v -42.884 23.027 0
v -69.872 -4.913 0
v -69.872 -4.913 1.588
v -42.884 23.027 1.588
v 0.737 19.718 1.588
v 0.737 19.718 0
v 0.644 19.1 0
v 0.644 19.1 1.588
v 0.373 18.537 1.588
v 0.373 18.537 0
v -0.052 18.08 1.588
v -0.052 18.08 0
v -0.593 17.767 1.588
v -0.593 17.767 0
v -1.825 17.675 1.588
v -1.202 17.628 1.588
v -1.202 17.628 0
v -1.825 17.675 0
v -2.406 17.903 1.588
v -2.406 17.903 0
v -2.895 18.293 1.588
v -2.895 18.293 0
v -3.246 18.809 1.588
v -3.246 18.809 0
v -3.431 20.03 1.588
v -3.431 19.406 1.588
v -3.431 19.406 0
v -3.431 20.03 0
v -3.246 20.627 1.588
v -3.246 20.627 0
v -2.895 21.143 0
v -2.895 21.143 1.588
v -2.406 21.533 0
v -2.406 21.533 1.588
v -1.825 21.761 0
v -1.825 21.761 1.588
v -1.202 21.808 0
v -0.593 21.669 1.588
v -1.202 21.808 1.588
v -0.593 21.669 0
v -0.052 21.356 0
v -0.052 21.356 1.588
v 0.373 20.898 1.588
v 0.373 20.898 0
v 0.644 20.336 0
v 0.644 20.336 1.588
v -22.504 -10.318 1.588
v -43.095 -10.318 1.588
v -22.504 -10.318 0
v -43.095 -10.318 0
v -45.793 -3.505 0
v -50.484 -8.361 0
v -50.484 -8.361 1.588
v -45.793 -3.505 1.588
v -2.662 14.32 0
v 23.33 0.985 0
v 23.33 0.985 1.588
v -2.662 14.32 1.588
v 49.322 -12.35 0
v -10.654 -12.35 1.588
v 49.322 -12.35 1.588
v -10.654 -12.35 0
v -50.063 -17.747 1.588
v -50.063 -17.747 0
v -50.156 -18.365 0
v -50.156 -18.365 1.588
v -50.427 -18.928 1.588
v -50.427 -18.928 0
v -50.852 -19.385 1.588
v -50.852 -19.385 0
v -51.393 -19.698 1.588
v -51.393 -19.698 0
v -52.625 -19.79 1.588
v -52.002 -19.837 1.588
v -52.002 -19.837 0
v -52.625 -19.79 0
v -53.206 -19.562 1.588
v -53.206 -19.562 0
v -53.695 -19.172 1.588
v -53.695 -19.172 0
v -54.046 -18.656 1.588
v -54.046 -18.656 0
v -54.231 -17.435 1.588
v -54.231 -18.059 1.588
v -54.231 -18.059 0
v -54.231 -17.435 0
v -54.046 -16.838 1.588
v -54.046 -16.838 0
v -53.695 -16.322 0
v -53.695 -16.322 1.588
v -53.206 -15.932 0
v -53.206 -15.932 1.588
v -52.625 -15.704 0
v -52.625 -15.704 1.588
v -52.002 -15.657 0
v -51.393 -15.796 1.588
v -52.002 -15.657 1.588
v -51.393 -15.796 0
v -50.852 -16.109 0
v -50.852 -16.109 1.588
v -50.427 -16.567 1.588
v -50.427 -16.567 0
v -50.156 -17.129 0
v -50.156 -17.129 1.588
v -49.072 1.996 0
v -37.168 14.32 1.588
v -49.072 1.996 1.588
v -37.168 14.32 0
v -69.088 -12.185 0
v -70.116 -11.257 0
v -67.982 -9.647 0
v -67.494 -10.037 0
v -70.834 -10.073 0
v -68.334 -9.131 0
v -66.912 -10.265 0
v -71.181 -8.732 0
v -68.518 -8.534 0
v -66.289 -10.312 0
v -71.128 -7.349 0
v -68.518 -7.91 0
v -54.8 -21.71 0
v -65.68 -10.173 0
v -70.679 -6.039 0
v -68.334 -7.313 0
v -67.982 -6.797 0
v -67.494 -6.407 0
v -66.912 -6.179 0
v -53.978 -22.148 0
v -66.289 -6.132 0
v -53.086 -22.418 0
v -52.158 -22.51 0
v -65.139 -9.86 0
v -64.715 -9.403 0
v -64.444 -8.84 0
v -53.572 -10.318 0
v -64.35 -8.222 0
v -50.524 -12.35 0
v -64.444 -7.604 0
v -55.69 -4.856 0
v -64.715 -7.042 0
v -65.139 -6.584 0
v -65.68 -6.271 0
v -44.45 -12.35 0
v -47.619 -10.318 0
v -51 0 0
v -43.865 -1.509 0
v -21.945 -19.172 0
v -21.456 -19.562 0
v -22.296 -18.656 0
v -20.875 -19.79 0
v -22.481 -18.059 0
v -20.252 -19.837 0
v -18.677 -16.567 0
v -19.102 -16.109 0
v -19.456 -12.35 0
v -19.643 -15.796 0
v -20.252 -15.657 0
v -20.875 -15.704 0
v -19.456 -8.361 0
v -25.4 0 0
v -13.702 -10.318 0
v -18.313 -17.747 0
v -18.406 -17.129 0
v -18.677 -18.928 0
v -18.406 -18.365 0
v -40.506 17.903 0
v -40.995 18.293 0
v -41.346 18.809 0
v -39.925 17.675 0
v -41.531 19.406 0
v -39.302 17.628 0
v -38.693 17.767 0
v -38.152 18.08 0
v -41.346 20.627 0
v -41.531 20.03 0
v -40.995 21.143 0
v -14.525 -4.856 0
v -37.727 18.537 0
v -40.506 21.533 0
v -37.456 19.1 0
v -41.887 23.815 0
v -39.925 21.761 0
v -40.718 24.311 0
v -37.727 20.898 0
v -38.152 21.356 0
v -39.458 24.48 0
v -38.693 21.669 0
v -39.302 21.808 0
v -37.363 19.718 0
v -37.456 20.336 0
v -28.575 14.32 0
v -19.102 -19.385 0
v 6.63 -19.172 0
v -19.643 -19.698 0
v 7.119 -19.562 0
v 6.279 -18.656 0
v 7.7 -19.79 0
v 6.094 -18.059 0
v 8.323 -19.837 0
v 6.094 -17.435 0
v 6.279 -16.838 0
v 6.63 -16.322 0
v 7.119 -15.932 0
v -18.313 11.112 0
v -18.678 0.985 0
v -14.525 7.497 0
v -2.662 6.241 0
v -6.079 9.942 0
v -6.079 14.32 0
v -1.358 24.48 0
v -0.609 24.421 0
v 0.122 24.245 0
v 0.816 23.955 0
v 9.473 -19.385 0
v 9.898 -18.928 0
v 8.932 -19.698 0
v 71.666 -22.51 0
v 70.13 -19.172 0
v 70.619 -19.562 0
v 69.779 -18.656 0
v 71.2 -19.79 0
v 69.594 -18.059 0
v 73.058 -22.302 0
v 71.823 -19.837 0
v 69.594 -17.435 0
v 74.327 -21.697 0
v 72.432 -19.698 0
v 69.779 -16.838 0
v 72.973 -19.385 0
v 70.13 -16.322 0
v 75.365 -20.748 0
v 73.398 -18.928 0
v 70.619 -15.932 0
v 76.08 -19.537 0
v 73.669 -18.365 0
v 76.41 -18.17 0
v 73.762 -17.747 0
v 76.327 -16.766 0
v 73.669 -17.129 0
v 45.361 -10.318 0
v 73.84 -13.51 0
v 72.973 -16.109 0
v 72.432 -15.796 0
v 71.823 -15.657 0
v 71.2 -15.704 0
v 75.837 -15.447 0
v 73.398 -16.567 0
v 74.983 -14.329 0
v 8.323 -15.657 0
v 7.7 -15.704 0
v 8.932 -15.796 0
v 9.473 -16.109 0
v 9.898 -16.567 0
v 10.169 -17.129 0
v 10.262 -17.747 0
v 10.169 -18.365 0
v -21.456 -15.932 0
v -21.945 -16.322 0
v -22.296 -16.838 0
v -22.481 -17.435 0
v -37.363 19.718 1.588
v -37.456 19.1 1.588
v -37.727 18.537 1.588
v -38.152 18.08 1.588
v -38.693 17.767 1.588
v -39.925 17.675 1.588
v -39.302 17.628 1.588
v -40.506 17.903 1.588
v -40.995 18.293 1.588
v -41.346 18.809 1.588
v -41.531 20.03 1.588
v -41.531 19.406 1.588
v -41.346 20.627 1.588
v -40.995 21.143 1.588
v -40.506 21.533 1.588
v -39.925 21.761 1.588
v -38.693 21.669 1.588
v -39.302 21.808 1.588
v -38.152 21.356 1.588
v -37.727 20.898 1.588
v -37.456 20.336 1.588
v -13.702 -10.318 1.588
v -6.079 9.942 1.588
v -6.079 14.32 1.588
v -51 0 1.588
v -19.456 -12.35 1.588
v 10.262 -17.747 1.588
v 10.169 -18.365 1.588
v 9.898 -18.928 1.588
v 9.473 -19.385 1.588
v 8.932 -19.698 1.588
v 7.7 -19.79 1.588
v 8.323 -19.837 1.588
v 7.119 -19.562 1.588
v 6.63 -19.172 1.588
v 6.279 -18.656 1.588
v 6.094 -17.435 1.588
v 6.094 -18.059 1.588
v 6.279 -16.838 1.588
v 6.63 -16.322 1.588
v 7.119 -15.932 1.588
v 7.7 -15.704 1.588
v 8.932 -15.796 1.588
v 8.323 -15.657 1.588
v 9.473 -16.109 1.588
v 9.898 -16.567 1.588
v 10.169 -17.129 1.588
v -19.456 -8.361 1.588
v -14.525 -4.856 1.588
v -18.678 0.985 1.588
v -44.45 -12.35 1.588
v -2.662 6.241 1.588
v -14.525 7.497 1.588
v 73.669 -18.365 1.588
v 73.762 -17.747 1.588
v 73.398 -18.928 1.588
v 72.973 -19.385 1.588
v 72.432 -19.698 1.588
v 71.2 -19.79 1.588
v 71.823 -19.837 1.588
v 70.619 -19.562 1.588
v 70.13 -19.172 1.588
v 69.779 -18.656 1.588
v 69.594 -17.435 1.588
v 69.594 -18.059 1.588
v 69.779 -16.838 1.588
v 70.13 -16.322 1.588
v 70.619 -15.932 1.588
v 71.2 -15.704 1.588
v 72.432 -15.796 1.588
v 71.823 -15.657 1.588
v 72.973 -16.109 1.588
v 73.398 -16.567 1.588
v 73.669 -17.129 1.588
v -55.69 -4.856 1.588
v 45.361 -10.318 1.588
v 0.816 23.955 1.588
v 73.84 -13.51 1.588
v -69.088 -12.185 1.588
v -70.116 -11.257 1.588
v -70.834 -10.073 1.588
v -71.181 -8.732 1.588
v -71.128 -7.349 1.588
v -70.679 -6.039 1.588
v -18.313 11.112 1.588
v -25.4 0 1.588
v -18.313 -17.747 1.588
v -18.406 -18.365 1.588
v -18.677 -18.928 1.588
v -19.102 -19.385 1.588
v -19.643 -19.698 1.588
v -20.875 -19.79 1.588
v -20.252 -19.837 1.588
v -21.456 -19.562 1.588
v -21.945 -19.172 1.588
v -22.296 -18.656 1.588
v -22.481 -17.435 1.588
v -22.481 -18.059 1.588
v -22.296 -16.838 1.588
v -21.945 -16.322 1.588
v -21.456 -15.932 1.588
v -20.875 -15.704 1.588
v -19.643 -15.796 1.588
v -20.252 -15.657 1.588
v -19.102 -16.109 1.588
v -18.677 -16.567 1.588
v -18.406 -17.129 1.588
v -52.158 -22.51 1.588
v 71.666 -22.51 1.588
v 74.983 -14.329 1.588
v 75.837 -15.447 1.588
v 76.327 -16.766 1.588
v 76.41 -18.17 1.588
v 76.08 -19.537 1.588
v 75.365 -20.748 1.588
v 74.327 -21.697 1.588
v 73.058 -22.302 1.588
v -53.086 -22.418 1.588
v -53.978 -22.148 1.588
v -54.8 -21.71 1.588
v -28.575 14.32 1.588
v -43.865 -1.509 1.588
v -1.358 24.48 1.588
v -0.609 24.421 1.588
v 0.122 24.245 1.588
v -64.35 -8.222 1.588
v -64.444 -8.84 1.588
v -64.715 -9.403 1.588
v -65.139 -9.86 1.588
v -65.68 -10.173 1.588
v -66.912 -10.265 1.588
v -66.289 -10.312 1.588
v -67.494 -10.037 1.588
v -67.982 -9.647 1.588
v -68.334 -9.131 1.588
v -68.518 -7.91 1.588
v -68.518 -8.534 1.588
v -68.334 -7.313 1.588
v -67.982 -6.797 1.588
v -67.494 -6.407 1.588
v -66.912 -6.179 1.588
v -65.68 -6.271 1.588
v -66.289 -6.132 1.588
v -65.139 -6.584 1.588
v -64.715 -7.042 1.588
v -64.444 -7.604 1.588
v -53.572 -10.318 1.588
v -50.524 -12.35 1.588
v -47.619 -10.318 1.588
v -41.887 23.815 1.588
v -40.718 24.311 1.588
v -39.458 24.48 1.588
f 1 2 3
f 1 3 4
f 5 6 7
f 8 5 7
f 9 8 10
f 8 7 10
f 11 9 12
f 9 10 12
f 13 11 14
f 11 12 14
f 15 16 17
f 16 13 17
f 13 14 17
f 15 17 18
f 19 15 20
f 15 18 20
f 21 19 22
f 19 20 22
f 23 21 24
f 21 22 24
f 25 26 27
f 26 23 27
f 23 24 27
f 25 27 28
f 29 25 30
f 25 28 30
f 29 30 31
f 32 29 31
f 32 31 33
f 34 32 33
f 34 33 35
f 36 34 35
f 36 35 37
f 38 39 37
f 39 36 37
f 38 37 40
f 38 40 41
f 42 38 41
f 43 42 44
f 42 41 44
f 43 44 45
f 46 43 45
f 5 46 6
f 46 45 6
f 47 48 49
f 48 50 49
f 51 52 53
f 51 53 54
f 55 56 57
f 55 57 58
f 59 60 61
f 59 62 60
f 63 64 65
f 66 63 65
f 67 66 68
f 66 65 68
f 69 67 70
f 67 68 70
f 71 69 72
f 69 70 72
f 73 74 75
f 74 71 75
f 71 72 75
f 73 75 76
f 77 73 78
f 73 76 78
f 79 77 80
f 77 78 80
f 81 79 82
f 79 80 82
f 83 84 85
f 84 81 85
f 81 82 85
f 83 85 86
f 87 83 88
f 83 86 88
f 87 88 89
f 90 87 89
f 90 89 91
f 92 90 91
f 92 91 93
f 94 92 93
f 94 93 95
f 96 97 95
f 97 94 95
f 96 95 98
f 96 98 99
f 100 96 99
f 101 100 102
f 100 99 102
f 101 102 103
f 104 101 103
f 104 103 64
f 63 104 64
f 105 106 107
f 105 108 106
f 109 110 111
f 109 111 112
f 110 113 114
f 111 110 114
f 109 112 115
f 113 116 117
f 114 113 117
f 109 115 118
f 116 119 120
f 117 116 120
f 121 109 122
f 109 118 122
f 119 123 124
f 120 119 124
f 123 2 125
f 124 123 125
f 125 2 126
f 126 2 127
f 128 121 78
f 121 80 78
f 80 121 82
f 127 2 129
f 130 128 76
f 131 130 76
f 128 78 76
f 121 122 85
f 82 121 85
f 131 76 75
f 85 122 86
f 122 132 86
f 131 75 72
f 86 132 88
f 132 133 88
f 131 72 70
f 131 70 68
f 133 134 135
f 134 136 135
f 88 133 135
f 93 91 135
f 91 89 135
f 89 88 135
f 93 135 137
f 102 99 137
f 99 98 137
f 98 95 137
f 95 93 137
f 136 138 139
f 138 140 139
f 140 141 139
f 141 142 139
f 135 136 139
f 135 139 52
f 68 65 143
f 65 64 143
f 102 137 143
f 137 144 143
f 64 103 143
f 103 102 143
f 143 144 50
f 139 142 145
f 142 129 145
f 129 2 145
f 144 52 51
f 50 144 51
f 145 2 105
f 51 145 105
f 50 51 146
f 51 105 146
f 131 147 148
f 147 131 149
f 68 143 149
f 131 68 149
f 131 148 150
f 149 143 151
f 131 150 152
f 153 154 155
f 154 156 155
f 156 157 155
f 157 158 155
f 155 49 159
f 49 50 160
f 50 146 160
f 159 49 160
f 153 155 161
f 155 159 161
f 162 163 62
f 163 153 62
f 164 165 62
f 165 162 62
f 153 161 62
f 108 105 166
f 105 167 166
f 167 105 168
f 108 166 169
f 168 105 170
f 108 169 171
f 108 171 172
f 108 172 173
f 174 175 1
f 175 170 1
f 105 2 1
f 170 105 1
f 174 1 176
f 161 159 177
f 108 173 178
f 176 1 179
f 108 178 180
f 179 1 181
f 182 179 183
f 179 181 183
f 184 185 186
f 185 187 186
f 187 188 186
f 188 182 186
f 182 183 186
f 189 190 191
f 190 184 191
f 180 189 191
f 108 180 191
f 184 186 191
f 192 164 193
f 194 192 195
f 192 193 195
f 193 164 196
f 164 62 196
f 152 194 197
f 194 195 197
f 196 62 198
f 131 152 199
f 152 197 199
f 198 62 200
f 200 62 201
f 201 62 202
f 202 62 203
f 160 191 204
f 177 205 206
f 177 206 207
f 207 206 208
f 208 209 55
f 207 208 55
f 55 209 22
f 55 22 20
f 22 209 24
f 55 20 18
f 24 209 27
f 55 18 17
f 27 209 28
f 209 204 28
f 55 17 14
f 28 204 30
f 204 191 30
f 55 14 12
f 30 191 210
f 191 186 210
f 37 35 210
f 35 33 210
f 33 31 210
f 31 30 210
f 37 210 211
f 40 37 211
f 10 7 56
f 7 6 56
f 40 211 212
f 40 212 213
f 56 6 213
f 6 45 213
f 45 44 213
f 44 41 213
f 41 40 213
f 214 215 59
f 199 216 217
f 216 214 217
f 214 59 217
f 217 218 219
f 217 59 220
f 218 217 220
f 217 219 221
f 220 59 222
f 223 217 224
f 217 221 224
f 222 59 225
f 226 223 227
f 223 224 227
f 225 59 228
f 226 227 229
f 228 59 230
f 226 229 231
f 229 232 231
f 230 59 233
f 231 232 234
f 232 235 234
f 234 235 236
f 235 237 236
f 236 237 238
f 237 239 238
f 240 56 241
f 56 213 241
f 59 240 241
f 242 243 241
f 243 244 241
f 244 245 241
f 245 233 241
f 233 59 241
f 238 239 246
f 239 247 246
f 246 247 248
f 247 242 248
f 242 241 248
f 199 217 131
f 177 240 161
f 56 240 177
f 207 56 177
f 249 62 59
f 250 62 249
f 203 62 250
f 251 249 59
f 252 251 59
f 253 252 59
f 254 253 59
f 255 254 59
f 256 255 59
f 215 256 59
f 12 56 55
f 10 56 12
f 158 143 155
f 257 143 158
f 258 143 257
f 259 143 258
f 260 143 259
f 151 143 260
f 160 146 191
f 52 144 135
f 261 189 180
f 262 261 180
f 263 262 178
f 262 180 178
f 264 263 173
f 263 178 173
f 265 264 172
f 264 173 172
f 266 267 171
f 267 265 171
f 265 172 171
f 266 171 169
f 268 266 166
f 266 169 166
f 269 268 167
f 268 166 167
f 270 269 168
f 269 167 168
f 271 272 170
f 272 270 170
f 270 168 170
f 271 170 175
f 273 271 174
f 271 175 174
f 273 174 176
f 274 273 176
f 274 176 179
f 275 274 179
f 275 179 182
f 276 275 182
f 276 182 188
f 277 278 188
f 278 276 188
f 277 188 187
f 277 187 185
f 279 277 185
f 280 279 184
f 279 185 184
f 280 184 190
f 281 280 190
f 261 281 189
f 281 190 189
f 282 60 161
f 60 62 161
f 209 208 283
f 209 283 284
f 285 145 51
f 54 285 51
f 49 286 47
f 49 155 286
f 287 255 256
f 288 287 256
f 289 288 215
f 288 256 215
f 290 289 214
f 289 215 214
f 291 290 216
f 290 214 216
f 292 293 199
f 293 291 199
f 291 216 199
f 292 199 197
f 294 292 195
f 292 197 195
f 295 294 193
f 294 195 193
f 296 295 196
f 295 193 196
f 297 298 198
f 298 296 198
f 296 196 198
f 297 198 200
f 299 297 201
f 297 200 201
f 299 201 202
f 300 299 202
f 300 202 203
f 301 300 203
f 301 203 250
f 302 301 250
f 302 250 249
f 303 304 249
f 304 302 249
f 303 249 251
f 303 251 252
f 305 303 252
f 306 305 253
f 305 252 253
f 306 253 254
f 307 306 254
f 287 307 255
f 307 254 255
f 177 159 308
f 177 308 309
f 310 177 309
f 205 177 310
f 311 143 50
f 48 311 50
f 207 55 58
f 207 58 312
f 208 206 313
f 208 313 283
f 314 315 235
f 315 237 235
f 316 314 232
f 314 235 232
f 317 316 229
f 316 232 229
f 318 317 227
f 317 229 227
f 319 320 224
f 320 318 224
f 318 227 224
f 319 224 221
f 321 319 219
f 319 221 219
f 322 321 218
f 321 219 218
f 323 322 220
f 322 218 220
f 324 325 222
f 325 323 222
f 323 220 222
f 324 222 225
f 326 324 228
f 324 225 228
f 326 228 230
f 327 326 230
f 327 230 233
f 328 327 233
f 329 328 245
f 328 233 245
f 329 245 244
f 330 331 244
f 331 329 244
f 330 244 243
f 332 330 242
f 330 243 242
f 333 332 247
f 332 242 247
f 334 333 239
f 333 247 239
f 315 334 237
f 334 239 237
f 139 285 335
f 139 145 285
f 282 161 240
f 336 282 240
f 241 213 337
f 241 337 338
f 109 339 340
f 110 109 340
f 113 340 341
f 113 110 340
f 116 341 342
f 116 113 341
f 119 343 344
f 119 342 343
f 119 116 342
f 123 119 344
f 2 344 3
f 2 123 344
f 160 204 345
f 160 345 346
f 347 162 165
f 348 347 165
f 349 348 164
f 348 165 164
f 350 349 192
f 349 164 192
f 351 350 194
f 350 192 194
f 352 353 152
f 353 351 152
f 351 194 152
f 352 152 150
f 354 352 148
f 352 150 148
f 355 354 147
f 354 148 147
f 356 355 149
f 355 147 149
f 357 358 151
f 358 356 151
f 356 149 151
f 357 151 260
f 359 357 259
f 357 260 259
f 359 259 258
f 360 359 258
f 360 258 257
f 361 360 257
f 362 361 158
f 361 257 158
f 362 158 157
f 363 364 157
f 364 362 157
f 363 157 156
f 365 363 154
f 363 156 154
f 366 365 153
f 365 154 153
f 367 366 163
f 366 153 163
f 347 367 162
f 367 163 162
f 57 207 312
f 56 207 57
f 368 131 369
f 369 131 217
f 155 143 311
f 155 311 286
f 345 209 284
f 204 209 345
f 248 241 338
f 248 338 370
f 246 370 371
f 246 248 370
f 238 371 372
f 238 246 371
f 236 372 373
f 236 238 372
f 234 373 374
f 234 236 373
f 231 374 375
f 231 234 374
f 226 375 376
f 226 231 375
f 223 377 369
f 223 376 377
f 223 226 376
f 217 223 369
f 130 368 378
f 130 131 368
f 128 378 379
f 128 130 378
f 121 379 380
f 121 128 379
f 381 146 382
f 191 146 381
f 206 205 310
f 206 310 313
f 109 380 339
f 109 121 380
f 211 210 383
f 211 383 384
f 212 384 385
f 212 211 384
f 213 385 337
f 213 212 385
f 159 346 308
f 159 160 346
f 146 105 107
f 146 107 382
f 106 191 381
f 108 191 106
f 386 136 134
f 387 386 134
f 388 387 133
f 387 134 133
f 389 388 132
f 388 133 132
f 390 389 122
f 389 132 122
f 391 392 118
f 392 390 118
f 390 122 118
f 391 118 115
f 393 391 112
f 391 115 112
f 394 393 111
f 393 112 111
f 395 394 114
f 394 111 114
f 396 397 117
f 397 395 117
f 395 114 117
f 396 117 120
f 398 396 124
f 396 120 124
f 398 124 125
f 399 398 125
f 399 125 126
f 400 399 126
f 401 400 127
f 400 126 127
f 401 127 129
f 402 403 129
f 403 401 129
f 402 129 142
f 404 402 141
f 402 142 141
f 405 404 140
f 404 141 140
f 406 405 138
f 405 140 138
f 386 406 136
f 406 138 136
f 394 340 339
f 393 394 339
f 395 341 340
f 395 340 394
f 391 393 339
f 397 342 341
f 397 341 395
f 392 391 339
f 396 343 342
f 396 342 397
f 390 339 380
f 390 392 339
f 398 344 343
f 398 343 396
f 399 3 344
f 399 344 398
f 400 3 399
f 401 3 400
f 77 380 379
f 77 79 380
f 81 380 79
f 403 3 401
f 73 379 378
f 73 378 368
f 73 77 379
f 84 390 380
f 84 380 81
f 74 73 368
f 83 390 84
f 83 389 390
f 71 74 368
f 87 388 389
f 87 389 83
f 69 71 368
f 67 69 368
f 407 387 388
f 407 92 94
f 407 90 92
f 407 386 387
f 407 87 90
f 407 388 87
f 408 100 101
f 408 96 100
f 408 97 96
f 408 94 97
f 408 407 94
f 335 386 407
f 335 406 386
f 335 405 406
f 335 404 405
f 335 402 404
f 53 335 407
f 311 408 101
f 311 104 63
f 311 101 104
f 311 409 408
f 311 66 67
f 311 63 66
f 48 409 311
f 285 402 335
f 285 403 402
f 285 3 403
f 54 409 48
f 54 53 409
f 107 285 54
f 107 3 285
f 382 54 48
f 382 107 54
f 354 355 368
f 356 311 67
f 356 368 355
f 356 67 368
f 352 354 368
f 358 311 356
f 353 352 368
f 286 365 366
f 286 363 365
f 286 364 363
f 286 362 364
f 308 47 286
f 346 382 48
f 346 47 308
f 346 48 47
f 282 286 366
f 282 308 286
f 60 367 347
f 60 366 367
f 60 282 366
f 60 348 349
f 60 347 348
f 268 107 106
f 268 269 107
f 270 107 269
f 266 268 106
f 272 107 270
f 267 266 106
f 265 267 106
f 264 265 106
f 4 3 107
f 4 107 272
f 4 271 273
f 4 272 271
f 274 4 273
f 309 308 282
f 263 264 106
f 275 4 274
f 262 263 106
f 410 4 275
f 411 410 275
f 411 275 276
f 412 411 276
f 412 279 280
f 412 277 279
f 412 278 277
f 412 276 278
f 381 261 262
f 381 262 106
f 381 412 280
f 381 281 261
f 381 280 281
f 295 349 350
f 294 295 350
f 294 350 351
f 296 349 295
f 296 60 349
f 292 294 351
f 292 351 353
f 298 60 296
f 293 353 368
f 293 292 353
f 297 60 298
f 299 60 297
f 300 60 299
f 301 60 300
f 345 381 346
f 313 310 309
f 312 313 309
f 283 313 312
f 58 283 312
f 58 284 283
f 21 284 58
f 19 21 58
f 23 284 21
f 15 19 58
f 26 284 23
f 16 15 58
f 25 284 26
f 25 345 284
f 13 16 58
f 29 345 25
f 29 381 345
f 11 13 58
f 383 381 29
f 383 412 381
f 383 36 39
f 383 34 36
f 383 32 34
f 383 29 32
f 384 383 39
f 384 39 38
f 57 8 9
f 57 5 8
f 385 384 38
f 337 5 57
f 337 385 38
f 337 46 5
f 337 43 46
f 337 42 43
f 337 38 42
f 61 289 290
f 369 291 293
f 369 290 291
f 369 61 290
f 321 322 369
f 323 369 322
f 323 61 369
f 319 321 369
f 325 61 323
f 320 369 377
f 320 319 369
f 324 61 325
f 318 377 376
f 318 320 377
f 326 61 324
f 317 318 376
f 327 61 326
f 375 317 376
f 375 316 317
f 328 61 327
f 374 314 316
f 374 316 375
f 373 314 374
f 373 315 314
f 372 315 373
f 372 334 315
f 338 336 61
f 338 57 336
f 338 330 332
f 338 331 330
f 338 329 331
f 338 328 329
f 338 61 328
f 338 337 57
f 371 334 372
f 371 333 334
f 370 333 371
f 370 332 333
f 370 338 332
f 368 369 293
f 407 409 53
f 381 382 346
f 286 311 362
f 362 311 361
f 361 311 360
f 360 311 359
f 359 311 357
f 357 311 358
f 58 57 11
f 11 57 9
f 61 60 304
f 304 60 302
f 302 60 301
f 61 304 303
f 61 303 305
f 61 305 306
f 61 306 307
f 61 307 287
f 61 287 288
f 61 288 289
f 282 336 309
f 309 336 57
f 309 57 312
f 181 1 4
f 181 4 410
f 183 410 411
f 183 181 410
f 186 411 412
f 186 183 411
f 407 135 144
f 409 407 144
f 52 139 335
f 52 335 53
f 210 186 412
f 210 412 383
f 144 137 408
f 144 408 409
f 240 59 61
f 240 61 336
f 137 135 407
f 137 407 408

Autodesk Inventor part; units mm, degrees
ref_plane "YZ Plane" through (0, 0, 0) normal (1, 0, 0) x (0, 1, 0)
ref_plane "XZ Plane" through (0, 0, 0) normal (0, 1, 0) x (-1, 0, 0)
ref_plane "XY Plane" through (0, 0, 0) normal (0, 0, 1) x (1, 0, 0)
sketch "Sketch1" plane through (0, 0, 0) normal (0, 0, 1) x (1, 0, 0)
  circle A0 centre (-66.446, -8.2221) radius 2.0955
  arc A1 (-69.8715, -4.9134) -> (-69.0877, -12.1847) centre (-66.446, -8.2221) ccw
  circle A2 centre (-39.4585, 19.7179) radius 2.0955
  circle A3 centre (-1.3585, 19.7179) radius 2.0955
  arc A4 (-39.4585, 24.4804) -> (-42.884, 23.0266) centre (-39.4585, 19.7179) ccw
  arc A5 (0.8155, 23.9553) -> (-1.3585, 24.4804) centre (-1.3585, 19.7179) ccw
  line L0 (-39.4585, 24.4804) -> (-1.3585, 24.4804)
  line L1 (-69.8715, -4.9134) -> (-42.884, 23.0266)
  circle A6 centre (-52.1585, -17.7471) radius 2.0955
  arc A7 (-54.8002, -21.7097) -> (-52.1585, -22.5096) centre (-52.1585, -17.7471) ccw
  circle A8 centre (-20.4085, -17.7471) radius 2.0955
  circle A9 centre (8.1665, -17.7471) radius 2.0955
  circle A10 centre (71.6665, -17.7471) radius 2.0955
  arc A11 (71.6665, -22.5096) -> (73.8405, -13.5097) centre (71.6665, -17.7471) ccw
  line L2 (0.8155, 23.9553) -> (73.8405, -13.5097)
  line L3 (-52.1585, -22.5096) -> (71.6665, -22.5096)
  line L4 (-54.8002, -21.7097) -> (-69.0877, -12.1847)
  line L5 (-28.575, 14.3204) -> (-37.1677, 14.3204)
  line L6 (-53.5722, -10.3176) -> (-50.5242, -12.3496)
  line L7 (-19.456, -12.3496) -> (-22.504, -10.3176)
  line L8 (-10.6535, -12.3496) -> (-13.7015, -10.3176)
  line L9 (-13.7015, -10.3176) -> (45.361, -10.3176)
  line L10 (-13.7015, -10.3176) -> (45.361, -10.3176) construction
  line L11 (-44.45, -12.3496) -> (-19.456, -12.3496)
  line L12 (-10.6535, -12.3496) -> (49.3216, -12.3496)
  line L13 (-50.5242, -12.3496) -> (-47.6187, -10.3176)
  line L14 (-44.45, -12.3496) -> (-43.0953, -10.3176)
  line L15 (-53.5722, -10.3176) -> (-47.6187, -10.3176)
  line L16 (-43.0953, -10.3176) -> (-22.504, -10.3176)
  line L17 (-53.5722, -10.3176) -> (-47.6187, -10.3176) construction
  line L18 (-43.0953, -10.3176) -> (-22.504, -10.3176) construction
  line L19 (-55.6904, -4.856) -> (-50.4835, -8.3613)
  line L20 (-51, 0) -> (-45.7931, -3.5053)
  line L21 (-49.0715, 1.9965) -> (-43.8646, -1.5088)
  line L22 (-50.4835, -8.3613) -> (-45.7931, -3.5053)
  line L23 (-43.8646, -1.5088) -> (-28.575, 14.3204)
  line L24 (-37.1677, 14.3204) -> (-49.0715, 1.9965)
  line L25 (-51, 0) -> (-55.6904, -4.856)
  line L26 (-2.6623, 14.3204) -> (-2.6623, 6.2412)
  line L27 (-2.6623, 6.2412) -> (23.3297, 0.9854)
  line L28 (23.3297, 0.9854) -> (-2.6623, 14.3204)
  line L29 (49.3216, -12.3496) -> (45.361, -10.3176)
  line L30 (-6.0786, 14.3204) -> (-18.313, 11.1125)
  line L31 (-18.313, 11.1125) -> (-25.4, 0)
  line L32 (-25.4, 0) -> (-19.456, -8.3613)
  line L33 (-19.456, -8.3613) -> (-14.5251, -4.856)
  line L34 (-14.5251, -4.856) -> (-18.6777, 0.9854)
  line L35 (-18.6777, 0.9854) -> (-14.5251, 7.4968)
  line L36 (-14.5251, 7.4968) -> (-6.0786, 9.9421)
  line L37 (-6.0786, 9.9421) -> (-6.0786, 14.3204)
  point P0 (0, 0)
  dimension "d0" = 9.525
  dimension "d1" = 9.525
  dimension "d2" = 9.525
  dimension "d3" = 9.525
  dimension "d4" = 4.191
  dimension "d5" = 4.191
  dimension "d6" = 9.525
  dimension "d9" = 10.16
extrude "Extrusion1" add sketch "Sketch1" along normal blind 1.5875
equation "\"BendRadius\" = Thickness"
equation "\"BendReliefWidth\" = Thickness"
equation "\"BendReliefDepth\" = 0.5 * Thickness"
equation "\"CornerReliefSize\" = 4 * Thickness"
equation "\"MinimumRemnant\" = 2 * Thickness"
equation "\"TransitionRadius\" = BendRadius"
equation "\"JacobiRadiusSize\" = BendRadius"
equation "\"GapSize\" = Thickness"
equation "\"Thickness\" = 1.5875"
properties part number "battery_mount_plate" material "Acetal Resin, White"
